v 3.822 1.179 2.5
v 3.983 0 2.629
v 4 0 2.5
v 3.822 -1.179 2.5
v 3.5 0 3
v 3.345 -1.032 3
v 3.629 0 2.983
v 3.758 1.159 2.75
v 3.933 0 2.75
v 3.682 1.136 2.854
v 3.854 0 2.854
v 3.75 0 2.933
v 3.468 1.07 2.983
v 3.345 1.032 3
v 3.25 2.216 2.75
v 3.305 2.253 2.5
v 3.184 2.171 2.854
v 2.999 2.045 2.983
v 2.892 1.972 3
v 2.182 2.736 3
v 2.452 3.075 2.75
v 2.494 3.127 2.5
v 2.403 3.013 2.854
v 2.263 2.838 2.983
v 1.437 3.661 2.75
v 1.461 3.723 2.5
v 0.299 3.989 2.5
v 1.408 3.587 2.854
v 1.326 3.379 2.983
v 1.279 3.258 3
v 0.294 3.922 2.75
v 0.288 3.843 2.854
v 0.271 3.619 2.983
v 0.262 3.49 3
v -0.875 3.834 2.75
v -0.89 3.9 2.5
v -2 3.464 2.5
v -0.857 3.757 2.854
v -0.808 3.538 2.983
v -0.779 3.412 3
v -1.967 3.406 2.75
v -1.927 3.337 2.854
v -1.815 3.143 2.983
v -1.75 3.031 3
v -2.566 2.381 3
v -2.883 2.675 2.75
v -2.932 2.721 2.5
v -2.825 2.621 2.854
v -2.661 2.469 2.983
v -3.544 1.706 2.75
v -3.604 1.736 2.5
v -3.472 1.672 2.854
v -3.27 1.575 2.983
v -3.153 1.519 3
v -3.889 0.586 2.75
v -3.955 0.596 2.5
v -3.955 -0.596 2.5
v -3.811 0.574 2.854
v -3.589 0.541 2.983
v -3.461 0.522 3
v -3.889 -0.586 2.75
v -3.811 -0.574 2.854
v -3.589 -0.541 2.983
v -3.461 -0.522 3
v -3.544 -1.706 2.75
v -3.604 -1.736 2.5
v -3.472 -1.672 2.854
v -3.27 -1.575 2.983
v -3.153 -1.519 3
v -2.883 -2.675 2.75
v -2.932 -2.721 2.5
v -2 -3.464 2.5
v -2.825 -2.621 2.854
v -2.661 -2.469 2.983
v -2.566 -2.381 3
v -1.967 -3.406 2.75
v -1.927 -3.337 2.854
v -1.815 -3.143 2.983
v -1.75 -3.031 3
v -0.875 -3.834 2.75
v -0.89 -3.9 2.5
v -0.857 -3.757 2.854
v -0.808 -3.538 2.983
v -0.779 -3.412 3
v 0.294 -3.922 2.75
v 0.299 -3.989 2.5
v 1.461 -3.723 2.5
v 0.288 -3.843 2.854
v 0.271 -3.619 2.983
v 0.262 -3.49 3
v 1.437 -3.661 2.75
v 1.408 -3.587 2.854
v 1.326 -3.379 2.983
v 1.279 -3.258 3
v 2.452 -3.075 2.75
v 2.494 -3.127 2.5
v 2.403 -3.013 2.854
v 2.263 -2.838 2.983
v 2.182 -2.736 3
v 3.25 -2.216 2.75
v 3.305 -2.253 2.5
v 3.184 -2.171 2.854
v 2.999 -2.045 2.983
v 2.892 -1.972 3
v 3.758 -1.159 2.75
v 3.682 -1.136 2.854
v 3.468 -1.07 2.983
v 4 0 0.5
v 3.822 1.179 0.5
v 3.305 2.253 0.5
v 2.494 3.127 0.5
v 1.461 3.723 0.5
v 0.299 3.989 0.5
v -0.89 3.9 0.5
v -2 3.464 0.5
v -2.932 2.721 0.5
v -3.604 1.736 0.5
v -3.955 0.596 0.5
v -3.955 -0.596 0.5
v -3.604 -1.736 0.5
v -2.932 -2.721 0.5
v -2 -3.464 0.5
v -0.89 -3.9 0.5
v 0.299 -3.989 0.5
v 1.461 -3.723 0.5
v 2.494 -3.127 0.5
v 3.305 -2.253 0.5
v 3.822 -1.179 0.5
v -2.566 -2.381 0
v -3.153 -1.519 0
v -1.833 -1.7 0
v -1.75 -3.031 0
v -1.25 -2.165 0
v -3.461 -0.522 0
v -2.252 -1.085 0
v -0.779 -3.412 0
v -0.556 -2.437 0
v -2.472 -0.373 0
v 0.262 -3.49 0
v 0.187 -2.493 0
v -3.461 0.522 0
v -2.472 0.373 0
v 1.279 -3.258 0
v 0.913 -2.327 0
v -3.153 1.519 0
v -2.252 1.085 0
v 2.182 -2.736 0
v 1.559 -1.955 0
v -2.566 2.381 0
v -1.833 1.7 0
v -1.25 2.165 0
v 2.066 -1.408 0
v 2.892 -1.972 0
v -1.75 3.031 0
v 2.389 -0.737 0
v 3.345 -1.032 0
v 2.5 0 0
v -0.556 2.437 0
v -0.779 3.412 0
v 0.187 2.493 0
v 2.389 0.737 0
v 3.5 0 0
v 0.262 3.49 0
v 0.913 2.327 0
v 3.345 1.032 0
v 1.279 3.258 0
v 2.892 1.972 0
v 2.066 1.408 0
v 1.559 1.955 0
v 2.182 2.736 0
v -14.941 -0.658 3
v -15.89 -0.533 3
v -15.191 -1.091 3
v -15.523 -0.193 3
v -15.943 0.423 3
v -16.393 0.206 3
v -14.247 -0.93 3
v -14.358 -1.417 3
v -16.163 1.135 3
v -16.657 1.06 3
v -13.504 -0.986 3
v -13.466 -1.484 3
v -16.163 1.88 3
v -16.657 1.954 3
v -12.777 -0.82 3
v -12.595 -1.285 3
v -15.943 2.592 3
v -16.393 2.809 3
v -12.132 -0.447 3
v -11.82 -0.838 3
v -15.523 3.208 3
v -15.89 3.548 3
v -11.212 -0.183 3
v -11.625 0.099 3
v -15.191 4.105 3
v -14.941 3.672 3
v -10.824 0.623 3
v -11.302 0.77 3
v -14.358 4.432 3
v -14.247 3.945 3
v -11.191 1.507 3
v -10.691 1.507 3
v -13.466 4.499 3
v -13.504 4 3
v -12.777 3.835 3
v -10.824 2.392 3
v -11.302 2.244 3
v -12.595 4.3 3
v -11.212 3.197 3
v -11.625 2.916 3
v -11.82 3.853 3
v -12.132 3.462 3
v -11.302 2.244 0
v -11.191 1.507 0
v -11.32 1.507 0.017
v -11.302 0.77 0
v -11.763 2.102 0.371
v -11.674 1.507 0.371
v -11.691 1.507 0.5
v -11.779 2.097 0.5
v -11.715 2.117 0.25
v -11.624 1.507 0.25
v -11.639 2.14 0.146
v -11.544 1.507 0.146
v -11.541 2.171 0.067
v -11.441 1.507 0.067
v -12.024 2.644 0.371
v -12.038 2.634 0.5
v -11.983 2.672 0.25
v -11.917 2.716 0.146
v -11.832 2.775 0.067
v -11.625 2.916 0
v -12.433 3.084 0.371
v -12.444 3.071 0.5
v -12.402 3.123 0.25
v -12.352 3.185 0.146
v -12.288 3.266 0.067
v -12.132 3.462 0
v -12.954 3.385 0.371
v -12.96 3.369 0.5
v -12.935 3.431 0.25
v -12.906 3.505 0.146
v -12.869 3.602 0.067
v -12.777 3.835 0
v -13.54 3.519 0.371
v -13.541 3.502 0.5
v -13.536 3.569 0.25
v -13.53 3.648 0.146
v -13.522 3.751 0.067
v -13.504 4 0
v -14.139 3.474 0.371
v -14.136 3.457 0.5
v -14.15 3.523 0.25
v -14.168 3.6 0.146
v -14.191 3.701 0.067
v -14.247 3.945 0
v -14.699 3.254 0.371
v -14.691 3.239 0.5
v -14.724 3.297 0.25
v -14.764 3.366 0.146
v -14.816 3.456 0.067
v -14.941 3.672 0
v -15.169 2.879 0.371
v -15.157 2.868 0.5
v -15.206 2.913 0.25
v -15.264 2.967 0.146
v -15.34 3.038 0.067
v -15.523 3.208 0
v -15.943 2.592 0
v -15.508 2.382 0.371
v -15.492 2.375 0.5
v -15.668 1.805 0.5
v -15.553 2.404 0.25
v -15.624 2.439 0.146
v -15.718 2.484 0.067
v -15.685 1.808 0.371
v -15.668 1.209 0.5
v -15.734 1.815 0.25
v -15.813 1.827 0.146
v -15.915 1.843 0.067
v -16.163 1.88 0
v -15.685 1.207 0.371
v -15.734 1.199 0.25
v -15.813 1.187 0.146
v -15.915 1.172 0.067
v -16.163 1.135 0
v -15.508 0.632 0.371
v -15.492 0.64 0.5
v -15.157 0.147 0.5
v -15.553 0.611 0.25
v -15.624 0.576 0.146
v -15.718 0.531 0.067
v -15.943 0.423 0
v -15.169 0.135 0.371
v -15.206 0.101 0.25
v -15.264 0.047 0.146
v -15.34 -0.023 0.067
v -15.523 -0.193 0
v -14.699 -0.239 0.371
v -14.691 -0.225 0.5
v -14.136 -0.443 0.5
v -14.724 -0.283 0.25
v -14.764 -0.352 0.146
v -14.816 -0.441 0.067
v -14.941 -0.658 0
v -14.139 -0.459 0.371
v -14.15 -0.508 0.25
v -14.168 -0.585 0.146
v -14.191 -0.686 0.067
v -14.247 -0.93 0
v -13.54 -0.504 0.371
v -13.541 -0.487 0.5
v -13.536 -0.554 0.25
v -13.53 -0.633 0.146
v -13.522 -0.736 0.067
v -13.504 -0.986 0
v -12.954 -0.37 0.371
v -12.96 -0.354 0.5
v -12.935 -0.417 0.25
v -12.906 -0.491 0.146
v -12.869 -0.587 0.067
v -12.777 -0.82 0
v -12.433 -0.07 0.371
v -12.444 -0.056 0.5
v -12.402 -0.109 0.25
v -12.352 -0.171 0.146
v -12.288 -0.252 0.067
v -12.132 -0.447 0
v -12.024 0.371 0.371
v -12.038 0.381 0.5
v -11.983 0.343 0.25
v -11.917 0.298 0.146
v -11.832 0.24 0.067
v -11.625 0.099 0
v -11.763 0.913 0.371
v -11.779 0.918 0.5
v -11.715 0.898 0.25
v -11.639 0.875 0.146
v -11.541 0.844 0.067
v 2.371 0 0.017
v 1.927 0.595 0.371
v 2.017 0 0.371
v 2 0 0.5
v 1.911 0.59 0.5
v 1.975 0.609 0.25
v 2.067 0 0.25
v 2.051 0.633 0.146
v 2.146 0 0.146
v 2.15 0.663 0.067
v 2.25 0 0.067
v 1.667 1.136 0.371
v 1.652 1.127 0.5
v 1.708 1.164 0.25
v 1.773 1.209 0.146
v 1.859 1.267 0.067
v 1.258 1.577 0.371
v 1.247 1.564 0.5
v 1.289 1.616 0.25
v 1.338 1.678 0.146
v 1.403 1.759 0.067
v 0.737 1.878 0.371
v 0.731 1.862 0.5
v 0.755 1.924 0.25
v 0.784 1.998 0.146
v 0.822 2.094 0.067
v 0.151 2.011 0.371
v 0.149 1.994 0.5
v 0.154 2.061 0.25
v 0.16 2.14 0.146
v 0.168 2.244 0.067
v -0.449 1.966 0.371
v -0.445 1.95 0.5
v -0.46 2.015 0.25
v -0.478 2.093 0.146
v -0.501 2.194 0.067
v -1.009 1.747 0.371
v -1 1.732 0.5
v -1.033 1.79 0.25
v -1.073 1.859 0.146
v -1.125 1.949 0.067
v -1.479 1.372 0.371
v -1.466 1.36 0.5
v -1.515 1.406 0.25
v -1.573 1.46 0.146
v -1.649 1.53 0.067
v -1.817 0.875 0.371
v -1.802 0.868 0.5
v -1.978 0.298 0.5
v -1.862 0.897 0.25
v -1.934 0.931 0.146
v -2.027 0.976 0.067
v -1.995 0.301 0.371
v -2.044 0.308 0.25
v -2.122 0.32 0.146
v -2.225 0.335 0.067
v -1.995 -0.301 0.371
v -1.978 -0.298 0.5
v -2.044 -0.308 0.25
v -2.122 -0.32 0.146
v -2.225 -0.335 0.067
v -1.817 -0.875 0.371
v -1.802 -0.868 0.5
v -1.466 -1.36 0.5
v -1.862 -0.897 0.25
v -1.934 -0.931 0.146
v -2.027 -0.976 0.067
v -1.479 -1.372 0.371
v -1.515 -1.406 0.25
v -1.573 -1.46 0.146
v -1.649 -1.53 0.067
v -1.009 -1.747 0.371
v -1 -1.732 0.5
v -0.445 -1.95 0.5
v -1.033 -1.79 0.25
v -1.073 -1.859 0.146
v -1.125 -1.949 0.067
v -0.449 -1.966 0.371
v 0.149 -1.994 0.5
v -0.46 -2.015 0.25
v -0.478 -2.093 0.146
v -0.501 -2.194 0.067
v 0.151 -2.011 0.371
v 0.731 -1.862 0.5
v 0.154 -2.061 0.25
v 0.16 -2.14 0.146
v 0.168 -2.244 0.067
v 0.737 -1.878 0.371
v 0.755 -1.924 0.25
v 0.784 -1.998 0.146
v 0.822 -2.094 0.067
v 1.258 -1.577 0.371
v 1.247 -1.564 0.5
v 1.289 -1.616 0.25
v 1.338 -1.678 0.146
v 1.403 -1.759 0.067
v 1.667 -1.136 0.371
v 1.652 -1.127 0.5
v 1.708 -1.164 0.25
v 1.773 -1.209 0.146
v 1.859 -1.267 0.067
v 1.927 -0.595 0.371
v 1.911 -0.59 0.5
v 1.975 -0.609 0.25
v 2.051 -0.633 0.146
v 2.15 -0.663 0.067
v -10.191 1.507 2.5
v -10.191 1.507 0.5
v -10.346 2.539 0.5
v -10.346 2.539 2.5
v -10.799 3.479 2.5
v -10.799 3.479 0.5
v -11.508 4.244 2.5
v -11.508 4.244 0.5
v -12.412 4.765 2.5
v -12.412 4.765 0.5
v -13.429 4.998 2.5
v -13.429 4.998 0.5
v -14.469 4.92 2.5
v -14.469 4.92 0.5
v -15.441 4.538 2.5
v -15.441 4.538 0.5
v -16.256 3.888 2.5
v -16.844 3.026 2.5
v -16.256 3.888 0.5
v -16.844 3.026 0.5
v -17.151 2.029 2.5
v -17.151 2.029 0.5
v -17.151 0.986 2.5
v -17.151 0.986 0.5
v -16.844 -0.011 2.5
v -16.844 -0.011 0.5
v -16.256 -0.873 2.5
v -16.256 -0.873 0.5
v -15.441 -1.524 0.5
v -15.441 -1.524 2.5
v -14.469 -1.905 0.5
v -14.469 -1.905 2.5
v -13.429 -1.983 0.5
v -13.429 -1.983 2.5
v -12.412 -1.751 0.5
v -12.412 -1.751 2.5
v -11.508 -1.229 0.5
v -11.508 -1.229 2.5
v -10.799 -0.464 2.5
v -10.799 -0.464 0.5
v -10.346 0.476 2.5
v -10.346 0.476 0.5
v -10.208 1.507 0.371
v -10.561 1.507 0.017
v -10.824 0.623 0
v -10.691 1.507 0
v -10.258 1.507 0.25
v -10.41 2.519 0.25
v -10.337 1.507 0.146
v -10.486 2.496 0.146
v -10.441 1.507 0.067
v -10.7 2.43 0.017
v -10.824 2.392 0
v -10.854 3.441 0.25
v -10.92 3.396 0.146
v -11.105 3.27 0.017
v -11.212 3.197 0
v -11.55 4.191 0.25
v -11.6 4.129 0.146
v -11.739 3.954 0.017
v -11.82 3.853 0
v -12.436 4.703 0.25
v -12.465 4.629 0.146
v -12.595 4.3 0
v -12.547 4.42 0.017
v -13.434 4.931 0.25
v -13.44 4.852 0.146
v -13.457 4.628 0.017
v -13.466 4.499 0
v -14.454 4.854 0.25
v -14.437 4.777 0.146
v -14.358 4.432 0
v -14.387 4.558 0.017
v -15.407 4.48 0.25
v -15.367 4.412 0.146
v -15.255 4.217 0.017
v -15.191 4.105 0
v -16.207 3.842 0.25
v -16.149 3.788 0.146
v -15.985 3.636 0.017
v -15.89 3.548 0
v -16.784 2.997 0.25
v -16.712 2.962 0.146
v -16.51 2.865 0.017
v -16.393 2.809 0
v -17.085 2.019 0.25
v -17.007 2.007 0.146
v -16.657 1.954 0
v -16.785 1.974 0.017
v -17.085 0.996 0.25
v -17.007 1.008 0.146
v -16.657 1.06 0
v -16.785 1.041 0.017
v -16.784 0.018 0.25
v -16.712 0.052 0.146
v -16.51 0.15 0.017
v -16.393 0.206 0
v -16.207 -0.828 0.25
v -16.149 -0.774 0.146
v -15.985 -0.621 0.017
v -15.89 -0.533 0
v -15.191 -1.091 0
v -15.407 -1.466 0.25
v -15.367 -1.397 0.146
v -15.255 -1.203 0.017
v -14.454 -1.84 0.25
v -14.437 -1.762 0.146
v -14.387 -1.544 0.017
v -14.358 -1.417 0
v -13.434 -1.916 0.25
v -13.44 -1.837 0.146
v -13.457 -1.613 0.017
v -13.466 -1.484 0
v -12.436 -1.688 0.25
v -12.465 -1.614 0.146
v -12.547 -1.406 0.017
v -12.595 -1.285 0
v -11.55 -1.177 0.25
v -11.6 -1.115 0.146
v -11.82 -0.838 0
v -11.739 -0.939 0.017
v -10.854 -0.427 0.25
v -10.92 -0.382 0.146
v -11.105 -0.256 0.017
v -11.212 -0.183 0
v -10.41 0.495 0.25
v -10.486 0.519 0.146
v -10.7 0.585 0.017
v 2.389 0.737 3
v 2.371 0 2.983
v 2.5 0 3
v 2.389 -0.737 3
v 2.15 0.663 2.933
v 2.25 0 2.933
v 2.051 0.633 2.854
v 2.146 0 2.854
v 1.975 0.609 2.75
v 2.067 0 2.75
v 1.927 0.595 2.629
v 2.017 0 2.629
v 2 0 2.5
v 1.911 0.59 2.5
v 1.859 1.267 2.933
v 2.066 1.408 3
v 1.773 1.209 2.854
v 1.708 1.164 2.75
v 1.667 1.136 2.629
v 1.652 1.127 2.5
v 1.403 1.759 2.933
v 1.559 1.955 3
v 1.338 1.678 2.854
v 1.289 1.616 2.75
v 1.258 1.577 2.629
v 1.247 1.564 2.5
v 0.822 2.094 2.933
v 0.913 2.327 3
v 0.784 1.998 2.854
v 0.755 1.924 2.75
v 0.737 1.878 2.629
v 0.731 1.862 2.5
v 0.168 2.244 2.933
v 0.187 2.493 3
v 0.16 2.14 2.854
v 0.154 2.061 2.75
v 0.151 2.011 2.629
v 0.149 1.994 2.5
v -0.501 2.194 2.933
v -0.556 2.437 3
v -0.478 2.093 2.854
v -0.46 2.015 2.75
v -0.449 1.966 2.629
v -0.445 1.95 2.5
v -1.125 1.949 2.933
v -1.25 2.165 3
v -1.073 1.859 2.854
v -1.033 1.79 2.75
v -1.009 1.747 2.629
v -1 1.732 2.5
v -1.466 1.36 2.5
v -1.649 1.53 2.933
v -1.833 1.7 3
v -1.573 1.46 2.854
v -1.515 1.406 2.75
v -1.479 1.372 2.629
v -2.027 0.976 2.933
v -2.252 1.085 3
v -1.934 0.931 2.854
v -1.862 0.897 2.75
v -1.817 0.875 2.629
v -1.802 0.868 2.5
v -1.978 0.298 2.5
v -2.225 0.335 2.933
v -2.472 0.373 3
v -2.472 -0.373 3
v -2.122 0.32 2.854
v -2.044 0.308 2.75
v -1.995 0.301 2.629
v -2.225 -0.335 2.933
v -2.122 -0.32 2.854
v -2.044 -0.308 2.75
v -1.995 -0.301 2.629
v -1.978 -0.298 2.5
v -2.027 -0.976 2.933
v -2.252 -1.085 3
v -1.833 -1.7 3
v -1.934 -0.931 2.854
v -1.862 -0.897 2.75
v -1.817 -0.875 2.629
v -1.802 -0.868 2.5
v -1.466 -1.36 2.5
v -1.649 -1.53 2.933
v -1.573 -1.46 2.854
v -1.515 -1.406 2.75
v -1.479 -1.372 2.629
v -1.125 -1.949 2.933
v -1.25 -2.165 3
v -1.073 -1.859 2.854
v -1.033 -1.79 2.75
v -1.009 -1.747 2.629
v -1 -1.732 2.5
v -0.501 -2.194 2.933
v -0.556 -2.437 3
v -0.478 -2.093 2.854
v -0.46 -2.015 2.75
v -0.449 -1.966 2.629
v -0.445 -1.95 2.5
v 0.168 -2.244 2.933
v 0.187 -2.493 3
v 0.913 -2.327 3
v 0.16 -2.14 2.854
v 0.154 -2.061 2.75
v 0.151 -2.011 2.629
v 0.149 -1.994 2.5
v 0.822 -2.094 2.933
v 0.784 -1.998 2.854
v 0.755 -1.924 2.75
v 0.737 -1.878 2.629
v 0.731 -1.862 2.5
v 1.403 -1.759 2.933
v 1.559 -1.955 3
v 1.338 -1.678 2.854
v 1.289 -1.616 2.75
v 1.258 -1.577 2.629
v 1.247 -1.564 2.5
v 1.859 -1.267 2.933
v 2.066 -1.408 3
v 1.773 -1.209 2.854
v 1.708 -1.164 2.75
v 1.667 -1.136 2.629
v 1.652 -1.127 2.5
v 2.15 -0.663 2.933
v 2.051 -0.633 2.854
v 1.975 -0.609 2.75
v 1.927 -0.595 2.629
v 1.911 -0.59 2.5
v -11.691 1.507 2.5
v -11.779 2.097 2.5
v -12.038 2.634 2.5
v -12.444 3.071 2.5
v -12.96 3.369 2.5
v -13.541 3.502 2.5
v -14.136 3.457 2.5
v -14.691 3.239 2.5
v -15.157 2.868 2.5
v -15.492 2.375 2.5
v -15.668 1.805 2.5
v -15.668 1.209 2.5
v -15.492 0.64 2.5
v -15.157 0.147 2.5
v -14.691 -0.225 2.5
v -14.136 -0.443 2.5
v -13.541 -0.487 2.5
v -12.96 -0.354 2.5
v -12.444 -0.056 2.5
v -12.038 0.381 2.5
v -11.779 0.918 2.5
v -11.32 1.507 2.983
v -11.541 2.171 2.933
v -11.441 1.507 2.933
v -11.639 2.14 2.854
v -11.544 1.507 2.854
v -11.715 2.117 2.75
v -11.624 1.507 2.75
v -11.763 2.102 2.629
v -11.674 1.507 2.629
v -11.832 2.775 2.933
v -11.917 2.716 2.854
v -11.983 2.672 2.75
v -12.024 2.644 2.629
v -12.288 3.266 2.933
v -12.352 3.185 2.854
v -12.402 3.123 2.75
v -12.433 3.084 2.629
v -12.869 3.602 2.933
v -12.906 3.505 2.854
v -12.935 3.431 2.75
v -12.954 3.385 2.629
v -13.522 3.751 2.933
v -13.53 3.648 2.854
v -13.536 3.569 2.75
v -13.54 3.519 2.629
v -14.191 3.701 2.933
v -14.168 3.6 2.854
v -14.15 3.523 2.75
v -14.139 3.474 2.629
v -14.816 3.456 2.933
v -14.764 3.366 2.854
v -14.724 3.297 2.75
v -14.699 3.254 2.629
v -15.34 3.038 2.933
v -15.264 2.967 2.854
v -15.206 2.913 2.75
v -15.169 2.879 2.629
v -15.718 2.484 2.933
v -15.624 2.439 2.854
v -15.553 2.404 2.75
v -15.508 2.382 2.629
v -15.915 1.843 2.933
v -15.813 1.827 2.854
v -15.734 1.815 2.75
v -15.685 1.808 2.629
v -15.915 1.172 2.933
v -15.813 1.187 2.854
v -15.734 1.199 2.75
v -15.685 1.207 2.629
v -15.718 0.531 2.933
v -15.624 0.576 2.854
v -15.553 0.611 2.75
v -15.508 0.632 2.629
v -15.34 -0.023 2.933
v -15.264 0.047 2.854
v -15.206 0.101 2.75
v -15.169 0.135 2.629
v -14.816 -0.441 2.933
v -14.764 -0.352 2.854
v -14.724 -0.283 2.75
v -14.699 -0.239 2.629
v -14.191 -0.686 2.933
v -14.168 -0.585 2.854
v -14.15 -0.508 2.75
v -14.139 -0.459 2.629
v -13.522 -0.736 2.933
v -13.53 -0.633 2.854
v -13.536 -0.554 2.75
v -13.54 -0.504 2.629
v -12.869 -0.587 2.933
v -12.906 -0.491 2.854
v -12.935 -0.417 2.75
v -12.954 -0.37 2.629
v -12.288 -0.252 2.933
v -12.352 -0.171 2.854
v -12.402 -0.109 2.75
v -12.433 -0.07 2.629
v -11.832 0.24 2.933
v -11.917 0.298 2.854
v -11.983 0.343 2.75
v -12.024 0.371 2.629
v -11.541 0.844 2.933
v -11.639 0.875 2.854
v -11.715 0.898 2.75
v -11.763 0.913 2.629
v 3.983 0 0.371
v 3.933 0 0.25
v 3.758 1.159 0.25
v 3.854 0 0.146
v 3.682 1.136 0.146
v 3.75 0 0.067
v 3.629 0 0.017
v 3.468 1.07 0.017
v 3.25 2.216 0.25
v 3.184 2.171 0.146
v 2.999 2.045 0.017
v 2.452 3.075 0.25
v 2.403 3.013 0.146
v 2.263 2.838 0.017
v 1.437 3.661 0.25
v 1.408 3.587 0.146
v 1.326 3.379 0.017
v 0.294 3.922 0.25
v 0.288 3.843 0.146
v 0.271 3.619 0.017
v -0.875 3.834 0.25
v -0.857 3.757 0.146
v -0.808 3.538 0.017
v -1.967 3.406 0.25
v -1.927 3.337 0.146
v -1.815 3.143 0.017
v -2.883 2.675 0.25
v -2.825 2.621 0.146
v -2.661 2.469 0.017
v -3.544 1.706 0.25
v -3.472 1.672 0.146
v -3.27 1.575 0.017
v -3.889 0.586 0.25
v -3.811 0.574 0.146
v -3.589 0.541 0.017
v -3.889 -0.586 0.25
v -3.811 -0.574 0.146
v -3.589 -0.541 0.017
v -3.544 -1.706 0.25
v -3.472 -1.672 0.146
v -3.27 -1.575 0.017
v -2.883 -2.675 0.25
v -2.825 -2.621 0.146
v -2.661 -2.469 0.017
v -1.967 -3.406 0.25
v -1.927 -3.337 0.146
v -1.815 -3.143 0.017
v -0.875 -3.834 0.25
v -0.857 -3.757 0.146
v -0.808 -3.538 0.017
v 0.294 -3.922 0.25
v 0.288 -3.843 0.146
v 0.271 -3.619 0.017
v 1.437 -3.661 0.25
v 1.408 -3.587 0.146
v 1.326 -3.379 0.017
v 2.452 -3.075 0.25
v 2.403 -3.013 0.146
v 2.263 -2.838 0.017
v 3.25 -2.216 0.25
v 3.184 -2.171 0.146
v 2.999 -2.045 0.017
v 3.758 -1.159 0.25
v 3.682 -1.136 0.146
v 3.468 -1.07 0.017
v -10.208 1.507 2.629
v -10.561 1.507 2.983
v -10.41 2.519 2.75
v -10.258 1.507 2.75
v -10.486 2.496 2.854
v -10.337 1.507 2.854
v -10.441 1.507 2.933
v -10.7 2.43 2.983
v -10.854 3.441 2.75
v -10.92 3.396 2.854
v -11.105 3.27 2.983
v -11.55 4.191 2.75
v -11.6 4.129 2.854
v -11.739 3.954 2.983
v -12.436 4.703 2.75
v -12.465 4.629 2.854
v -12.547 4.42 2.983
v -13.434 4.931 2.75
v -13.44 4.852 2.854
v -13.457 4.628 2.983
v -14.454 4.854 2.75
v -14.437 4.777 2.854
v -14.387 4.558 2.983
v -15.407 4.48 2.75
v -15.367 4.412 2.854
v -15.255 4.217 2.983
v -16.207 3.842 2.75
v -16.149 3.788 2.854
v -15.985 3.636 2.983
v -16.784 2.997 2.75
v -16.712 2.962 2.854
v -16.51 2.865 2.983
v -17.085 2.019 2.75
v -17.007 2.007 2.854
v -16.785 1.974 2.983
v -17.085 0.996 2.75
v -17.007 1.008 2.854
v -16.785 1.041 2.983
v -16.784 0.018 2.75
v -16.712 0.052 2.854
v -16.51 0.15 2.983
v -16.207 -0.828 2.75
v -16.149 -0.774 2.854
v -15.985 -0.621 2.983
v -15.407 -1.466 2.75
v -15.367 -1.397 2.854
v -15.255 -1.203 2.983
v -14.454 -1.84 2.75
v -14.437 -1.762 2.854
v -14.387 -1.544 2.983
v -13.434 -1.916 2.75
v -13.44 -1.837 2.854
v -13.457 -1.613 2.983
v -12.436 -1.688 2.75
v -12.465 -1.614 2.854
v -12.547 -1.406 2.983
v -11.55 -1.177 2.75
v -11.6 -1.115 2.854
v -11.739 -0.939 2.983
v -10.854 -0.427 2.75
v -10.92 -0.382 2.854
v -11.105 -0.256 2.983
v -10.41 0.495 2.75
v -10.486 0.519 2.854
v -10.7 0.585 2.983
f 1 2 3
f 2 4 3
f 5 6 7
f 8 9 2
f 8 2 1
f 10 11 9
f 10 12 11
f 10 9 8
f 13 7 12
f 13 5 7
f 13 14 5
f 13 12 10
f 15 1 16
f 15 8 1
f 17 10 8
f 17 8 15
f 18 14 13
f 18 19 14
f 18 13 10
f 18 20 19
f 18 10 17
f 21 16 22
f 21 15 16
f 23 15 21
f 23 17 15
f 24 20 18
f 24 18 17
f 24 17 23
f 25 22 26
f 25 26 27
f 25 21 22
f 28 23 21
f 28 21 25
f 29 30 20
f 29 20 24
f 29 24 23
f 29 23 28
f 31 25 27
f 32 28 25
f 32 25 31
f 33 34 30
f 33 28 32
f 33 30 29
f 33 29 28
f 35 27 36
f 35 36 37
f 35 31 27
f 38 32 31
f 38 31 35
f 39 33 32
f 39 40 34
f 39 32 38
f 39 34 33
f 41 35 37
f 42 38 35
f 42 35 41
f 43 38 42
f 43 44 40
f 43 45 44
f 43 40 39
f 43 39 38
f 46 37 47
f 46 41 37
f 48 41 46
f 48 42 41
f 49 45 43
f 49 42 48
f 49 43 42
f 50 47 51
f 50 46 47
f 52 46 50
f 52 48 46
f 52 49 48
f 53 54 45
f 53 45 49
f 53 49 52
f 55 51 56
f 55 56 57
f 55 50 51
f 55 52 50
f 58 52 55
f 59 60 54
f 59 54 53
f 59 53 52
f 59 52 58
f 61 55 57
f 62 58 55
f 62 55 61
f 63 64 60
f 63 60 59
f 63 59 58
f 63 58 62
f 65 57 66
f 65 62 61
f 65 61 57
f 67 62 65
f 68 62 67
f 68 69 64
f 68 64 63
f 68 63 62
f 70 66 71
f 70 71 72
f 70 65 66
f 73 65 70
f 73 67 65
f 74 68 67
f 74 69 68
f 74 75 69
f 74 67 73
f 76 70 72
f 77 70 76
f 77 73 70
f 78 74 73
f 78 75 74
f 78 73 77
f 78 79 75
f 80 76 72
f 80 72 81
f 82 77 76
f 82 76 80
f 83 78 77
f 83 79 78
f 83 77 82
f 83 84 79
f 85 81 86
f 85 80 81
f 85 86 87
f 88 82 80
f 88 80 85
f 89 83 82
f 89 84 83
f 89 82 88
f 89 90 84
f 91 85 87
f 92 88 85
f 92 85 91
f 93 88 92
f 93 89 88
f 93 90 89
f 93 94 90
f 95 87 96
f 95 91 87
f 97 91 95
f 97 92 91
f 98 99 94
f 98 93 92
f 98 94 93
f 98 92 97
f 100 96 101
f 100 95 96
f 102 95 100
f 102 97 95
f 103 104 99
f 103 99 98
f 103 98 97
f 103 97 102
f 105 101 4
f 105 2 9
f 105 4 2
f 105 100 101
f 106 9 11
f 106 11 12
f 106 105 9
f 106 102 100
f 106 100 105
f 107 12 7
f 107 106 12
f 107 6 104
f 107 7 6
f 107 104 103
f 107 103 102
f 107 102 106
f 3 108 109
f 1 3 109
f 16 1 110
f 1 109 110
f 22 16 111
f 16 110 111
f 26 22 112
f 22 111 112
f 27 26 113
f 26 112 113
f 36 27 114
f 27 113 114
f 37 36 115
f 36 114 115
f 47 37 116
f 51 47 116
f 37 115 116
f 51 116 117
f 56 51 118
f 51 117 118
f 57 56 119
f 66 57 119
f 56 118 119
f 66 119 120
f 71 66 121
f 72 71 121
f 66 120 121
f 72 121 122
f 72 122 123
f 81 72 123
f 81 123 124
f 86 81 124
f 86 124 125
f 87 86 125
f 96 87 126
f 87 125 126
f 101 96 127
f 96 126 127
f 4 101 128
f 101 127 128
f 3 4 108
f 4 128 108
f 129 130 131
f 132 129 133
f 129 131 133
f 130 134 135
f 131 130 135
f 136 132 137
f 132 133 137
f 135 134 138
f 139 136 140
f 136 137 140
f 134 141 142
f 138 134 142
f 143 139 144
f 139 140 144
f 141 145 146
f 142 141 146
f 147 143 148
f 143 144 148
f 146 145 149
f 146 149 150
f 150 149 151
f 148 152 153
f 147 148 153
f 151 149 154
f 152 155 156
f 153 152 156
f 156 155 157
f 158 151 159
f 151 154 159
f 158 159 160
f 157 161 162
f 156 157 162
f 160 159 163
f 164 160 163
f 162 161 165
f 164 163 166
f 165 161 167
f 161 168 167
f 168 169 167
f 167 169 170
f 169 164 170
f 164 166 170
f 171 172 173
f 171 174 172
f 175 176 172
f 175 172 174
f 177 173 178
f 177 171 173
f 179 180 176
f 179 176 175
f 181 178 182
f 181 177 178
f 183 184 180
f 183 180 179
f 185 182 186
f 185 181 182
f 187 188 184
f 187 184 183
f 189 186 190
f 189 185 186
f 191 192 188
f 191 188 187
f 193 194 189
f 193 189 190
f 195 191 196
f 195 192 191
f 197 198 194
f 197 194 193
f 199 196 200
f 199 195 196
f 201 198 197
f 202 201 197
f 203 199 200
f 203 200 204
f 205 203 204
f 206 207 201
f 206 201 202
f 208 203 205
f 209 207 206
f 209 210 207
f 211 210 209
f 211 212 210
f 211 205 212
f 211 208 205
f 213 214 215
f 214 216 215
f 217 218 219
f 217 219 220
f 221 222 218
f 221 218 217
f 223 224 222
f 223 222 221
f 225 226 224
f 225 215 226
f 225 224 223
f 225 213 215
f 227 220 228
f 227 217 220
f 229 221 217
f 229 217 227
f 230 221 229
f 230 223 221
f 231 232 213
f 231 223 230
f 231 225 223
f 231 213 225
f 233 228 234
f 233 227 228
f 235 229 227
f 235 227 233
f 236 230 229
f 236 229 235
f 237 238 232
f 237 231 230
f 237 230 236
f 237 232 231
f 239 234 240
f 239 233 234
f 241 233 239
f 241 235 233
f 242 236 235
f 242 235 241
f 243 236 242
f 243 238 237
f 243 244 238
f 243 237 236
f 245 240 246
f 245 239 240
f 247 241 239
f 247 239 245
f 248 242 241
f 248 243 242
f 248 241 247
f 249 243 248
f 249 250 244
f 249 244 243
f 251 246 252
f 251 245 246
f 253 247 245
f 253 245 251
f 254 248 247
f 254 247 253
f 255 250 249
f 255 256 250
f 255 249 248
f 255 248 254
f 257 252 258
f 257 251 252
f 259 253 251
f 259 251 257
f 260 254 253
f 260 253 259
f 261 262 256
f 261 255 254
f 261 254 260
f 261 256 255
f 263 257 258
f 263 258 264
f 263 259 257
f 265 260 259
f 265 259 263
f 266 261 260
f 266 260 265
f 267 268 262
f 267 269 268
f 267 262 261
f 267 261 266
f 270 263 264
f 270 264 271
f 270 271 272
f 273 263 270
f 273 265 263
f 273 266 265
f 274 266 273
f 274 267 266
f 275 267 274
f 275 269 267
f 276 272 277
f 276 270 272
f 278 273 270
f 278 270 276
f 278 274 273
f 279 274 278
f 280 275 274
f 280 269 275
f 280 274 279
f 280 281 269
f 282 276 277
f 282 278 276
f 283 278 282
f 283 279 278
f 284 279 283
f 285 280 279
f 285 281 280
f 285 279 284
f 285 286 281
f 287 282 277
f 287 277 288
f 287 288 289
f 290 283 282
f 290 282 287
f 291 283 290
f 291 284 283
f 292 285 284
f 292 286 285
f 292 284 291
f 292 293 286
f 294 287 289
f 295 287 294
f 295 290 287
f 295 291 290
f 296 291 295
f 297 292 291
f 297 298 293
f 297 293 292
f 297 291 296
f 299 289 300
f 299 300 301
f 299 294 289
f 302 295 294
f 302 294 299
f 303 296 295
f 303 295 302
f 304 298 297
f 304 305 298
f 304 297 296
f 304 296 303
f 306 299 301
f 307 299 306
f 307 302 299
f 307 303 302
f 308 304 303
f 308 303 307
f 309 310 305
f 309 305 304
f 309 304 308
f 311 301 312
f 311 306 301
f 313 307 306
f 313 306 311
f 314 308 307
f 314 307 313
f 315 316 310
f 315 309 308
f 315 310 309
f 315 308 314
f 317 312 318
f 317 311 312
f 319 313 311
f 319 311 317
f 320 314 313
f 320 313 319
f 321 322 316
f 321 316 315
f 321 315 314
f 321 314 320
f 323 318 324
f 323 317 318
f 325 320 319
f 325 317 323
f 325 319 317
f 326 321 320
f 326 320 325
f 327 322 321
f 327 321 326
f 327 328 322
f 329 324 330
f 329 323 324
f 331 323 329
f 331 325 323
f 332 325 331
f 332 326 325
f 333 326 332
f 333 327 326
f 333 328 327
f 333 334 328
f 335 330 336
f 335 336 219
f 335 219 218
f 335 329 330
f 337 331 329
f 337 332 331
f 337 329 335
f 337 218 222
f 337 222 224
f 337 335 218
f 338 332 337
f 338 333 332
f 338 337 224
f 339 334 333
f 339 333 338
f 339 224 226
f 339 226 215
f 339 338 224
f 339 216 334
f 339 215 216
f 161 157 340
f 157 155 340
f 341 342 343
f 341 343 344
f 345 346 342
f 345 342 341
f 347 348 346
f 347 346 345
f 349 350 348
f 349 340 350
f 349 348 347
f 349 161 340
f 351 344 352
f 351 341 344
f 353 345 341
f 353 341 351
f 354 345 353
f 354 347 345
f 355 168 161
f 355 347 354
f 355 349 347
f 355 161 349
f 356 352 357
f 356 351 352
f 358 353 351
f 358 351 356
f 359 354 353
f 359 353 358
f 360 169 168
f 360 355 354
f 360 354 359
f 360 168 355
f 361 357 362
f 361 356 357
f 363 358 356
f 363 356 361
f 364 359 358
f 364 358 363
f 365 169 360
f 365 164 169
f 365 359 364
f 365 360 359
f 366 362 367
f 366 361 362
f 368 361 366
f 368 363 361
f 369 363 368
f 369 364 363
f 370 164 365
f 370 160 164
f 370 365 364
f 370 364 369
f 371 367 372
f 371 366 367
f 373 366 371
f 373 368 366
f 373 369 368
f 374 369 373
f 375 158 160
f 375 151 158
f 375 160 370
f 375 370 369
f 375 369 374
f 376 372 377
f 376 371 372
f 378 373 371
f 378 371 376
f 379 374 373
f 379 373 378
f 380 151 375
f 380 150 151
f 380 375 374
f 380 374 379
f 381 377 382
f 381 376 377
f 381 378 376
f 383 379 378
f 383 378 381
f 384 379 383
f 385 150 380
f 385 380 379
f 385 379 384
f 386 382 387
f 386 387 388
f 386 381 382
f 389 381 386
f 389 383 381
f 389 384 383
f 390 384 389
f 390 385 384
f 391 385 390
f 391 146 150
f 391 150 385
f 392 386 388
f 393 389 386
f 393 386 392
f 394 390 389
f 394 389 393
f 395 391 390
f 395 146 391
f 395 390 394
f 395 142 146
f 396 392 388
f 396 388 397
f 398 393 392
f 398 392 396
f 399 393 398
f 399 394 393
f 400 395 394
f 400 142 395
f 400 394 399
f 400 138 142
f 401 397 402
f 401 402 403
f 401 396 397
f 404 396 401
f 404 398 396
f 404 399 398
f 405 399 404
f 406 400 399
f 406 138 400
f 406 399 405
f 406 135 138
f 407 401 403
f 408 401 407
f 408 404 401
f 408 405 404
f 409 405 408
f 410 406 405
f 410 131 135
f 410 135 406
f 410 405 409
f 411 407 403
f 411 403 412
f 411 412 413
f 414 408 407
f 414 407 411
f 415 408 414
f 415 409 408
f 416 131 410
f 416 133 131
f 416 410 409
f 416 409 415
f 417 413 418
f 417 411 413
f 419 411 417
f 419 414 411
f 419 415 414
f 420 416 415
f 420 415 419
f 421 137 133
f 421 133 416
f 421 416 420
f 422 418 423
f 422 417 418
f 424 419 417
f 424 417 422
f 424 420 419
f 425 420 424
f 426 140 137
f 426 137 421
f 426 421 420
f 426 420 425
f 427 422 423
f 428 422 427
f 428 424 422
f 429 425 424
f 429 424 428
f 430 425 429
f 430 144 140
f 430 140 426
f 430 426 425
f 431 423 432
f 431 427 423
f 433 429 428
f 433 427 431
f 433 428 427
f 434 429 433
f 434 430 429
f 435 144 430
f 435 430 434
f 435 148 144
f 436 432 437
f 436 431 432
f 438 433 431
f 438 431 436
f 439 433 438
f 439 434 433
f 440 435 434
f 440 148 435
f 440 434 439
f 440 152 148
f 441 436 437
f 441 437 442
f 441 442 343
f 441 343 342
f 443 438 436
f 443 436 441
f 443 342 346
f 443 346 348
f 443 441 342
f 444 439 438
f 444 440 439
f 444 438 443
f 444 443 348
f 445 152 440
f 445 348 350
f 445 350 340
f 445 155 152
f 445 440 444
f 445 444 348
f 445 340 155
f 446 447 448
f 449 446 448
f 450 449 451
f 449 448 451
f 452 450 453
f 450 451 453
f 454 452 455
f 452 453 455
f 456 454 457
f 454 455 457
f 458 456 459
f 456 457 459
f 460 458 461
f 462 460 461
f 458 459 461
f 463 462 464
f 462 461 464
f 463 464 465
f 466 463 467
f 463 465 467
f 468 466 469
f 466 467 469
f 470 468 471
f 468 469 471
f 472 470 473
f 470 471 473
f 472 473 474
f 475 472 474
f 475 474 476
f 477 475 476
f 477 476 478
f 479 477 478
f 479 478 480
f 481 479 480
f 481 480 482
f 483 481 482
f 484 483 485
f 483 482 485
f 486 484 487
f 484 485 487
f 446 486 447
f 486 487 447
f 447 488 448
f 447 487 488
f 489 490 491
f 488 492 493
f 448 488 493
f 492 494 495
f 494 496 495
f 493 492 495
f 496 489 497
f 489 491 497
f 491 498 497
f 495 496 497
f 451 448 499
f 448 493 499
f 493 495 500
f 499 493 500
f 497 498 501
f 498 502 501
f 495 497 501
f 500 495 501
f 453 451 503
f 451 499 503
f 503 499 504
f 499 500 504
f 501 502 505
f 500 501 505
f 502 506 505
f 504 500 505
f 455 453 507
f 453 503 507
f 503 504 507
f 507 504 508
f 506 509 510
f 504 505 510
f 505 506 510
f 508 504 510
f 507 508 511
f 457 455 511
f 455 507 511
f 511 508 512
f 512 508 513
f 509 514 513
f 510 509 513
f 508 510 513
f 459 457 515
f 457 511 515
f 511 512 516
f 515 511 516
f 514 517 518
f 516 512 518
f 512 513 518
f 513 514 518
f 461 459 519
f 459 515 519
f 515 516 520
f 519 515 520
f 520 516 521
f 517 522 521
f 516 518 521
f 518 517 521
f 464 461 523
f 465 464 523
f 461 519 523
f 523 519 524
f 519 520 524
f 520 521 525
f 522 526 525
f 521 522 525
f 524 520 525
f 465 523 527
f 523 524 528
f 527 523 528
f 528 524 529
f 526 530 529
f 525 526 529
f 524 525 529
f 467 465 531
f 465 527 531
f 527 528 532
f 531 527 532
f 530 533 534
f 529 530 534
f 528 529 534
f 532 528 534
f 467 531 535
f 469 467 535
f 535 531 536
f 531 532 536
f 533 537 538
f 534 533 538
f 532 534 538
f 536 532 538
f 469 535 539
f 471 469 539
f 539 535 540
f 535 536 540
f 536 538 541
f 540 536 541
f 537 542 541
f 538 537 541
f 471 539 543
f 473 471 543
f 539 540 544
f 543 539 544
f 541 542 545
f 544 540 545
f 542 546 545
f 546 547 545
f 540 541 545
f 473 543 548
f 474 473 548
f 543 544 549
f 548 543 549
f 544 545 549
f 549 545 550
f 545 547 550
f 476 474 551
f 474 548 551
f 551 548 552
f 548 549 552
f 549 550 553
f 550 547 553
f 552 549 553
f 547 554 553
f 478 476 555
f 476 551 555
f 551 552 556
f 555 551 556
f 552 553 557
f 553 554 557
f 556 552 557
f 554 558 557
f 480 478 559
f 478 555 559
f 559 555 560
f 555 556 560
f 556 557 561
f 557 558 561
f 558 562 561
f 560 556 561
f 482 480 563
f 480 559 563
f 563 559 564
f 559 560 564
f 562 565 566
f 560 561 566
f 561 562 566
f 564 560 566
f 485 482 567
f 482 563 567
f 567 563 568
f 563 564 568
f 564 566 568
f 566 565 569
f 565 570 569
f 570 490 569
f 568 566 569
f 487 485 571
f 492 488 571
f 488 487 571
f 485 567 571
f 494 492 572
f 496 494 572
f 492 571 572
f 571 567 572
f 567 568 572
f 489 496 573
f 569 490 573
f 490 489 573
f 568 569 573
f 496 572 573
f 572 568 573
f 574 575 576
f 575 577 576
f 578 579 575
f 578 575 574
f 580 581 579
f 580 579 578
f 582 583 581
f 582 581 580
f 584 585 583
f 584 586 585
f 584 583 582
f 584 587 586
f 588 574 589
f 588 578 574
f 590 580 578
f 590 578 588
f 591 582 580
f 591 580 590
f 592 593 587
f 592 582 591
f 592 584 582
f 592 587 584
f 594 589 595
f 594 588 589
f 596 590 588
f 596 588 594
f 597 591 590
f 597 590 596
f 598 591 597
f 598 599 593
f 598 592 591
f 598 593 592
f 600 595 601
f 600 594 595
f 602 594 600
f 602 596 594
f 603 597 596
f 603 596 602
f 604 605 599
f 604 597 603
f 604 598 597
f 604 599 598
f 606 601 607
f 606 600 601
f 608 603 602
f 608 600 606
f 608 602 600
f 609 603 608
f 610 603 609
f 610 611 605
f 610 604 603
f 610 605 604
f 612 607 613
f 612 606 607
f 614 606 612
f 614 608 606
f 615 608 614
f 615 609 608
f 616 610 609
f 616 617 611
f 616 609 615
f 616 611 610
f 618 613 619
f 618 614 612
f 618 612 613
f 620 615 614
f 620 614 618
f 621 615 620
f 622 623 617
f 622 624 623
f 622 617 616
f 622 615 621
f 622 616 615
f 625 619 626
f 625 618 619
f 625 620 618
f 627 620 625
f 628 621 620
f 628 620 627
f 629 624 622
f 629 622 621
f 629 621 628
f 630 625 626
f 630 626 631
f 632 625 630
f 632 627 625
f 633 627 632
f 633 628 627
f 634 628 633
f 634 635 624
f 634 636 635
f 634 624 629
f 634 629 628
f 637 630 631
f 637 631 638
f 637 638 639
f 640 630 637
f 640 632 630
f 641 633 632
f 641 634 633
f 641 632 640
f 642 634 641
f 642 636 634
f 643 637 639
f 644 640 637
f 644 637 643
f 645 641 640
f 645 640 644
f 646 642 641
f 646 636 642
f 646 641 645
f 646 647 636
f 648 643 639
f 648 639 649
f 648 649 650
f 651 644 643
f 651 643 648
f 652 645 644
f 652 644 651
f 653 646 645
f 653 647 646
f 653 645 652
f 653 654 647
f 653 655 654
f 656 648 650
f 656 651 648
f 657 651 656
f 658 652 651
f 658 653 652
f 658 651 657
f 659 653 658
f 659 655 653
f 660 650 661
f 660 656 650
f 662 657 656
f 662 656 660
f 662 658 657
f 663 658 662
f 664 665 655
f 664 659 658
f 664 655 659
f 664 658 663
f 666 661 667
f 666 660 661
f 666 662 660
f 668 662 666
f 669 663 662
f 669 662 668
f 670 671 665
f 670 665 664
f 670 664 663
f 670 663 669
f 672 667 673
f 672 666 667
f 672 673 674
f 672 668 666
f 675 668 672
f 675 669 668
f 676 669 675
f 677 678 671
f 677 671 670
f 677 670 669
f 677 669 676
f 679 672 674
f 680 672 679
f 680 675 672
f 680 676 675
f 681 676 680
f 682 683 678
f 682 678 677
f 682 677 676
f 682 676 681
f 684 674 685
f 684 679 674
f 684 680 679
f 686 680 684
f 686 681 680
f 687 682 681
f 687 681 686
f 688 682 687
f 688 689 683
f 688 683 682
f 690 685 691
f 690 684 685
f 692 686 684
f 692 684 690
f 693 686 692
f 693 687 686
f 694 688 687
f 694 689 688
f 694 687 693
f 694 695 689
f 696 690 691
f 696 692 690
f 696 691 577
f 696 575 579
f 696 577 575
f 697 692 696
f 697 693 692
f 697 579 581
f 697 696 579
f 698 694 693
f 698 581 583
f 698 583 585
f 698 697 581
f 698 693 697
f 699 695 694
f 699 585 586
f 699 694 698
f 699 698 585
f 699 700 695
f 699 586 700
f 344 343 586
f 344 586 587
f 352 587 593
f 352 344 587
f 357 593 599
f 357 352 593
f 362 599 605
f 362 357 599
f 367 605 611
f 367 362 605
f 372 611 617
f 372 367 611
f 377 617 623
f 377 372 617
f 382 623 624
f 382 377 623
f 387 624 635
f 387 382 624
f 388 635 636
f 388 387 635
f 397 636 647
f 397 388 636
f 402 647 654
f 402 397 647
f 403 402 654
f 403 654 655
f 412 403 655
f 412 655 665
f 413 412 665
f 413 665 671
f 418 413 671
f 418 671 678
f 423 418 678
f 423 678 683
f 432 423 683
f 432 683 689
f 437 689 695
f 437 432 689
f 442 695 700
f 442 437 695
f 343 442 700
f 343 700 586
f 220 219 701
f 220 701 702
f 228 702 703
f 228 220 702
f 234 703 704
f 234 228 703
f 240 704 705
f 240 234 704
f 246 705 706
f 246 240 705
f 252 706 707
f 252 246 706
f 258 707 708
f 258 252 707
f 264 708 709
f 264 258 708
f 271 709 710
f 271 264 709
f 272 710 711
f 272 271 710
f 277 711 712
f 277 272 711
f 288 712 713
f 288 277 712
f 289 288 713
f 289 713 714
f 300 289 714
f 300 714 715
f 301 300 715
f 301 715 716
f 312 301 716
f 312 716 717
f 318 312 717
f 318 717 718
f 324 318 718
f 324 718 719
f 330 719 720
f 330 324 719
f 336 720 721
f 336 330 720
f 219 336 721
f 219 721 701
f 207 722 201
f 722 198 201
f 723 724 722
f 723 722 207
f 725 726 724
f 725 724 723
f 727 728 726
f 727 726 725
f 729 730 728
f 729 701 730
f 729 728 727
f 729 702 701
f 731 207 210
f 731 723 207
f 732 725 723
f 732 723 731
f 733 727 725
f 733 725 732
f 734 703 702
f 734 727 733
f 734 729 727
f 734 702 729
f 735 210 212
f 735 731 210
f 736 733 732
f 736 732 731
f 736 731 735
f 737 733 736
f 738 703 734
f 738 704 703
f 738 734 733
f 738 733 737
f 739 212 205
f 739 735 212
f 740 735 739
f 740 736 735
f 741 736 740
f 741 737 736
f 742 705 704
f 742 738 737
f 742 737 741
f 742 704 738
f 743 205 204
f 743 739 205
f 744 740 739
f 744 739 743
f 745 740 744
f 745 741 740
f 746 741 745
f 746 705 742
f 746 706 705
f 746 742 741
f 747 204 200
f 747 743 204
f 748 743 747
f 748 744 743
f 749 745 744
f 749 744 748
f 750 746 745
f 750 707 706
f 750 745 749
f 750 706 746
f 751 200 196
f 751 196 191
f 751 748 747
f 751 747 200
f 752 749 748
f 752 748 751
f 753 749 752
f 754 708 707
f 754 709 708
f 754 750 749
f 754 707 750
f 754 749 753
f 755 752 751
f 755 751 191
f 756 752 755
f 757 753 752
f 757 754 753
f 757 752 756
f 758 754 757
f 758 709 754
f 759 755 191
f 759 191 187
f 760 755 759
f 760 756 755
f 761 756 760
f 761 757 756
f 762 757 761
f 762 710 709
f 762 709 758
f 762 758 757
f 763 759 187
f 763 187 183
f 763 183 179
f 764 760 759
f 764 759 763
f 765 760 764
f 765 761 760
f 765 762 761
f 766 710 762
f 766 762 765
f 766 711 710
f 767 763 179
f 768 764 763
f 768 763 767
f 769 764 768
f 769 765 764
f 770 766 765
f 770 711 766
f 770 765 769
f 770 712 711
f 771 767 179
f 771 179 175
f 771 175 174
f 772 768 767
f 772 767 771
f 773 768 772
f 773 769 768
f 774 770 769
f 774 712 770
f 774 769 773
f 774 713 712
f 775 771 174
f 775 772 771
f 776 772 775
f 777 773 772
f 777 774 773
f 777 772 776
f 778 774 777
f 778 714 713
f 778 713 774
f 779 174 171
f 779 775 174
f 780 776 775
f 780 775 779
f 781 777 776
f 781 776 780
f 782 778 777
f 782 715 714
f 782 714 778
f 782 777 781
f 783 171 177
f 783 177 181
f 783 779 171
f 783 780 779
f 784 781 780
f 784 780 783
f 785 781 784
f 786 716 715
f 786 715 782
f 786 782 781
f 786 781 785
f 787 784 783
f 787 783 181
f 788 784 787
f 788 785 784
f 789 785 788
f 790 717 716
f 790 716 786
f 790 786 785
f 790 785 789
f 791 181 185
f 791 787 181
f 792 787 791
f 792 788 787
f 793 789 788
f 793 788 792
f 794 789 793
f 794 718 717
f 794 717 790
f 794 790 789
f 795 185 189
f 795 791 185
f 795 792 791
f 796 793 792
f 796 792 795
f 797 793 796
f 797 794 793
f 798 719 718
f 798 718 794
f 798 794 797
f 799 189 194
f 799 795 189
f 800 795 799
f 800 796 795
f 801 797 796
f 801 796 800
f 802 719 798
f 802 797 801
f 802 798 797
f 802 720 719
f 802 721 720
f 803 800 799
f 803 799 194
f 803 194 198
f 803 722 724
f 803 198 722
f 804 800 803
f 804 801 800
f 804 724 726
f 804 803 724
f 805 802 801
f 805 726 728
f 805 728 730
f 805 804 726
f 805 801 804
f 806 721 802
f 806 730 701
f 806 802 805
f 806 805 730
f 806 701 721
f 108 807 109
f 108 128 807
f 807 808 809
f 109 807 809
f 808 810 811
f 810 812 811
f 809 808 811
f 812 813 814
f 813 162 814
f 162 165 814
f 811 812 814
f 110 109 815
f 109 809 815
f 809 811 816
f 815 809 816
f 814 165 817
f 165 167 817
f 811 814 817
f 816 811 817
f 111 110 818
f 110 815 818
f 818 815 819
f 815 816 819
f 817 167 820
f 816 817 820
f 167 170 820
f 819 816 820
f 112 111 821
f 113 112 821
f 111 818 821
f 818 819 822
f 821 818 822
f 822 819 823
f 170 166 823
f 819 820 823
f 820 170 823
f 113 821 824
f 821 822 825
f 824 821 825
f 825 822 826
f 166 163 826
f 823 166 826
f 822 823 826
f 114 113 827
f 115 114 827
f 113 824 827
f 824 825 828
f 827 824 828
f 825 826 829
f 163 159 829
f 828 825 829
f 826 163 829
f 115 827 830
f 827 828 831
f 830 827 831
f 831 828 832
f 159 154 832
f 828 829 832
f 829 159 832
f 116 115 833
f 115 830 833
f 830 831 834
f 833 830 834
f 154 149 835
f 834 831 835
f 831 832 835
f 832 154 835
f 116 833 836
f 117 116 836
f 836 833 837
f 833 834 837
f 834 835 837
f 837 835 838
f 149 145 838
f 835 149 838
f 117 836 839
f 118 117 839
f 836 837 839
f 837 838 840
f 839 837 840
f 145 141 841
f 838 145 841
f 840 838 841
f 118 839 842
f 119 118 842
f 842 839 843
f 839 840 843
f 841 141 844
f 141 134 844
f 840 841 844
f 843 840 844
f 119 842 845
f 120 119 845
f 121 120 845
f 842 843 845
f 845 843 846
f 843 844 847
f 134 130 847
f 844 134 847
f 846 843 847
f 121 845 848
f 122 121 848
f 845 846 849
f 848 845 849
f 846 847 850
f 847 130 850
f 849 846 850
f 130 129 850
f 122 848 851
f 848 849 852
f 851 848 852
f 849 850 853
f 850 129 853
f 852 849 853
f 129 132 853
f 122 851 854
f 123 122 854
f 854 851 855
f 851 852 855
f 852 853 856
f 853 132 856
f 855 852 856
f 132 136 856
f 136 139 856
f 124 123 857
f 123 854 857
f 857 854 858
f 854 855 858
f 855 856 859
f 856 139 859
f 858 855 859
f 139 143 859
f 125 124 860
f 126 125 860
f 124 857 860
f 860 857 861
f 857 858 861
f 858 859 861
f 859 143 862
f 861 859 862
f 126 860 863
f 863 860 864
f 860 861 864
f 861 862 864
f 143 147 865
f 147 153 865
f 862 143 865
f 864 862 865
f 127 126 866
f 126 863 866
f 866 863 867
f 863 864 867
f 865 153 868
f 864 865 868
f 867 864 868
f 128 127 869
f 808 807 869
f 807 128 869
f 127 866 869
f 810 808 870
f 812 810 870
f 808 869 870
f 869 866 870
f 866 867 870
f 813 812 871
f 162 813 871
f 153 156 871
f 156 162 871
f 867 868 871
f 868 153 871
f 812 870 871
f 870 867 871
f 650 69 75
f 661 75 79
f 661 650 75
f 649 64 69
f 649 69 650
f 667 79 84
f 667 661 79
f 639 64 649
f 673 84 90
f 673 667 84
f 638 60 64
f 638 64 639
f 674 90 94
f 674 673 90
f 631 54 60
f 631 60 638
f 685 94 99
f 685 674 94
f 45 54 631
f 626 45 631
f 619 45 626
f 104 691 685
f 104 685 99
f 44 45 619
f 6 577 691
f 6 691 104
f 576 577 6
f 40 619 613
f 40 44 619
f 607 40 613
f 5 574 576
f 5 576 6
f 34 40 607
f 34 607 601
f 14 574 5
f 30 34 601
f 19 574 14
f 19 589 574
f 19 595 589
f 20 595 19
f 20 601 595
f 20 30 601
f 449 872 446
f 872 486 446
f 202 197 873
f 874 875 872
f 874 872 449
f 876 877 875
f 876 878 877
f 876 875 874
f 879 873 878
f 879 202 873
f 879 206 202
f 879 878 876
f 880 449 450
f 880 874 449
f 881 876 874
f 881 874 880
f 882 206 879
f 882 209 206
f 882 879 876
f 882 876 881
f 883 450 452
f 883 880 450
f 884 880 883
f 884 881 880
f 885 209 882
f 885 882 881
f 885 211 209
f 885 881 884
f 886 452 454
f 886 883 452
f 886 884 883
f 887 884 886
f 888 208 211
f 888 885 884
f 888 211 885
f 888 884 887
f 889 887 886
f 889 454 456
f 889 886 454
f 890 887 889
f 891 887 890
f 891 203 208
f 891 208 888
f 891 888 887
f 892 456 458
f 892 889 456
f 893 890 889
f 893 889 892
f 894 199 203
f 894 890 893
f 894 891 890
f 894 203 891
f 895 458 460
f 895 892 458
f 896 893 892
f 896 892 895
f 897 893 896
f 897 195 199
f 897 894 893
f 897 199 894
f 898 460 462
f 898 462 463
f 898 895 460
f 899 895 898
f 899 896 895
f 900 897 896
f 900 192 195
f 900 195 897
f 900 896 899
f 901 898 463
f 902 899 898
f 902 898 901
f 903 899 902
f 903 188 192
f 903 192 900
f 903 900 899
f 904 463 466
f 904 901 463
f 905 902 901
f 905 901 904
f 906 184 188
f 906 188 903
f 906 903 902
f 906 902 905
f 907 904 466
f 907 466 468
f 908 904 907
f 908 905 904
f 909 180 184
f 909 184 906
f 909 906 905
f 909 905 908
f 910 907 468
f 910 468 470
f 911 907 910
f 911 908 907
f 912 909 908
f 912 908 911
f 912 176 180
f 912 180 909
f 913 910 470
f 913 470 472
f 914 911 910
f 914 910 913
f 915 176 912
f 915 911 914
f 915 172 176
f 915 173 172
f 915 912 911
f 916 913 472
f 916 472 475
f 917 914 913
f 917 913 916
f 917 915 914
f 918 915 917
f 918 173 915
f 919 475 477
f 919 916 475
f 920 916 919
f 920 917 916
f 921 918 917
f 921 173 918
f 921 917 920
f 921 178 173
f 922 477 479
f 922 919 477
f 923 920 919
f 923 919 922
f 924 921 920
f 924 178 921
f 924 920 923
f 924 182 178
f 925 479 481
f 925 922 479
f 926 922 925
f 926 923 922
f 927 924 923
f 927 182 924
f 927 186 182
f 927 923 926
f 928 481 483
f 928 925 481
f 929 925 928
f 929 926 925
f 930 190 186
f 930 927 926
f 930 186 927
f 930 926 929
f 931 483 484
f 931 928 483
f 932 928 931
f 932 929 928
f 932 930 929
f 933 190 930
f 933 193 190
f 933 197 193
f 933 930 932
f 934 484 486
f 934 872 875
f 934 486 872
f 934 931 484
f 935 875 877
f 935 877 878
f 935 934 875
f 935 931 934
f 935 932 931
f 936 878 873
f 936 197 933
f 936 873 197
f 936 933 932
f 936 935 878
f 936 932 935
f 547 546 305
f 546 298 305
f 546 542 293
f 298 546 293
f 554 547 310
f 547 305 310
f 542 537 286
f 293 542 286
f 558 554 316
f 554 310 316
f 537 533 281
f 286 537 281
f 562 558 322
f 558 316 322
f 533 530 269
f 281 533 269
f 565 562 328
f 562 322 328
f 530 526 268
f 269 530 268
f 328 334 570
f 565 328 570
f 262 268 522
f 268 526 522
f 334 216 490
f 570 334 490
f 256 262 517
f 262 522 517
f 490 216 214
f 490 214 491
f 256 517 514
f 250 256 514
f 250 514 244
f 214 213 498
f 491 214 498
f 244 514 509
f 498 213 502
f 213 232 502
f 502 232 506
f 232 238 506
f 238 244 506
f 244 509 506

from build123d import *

# Parameters (mm, degrees)
F0_R     = 4
F0_R_2   = 2
F1_DEPTH = 3
F2_R     = 0.5
F0_R_3   = 3.5
F3_DEPTH = 3
F4_R     = 0.5
F5_R     = 0.5


with BuildPart() as f1:
    # F0 (on Top) → F1 (new body)
    with BuildSketch(Plane.XY):
        Circle(F0_R)
        Circle(F0_R_2, mode=Mode.SUBTRACT)
    extrude(amount=F1_DEPTH)

    # F2
    f2_edges = [f1.edges().sort_by_distance(p)[0] for p in [
        (-2, 0, 3),
        (-2, 0, 0),
        (-4, 0, 0),
        (-4, 0, 3),
    ]]
    fillet(f2_edges, radius=F2_R)

    # F0 (on Top) → F3 (join)
    with BuildSketch(Plane.XY):
        Circle(F0_R)
        Circle(F0_R_2, mode=Mode.SUBTRACT)
        with Locations((-13.690544, 1.507337)):
            Circle(F0_R_3)
        with Locations((-13.690544, 1.507337)):
            Circle(F0_R_2, mode=Mode.SUBTRACT)
    extrude(amount=F3_DEPTH)

    # F4
    f4_edges = [f1.edges().sort_by_distance(p)[0] for p in [
        (-17.190544, 1.507337, 3),
        (-15.690544, 1.507337, 3),
        (-17.190544, 1.507337, 0),
        (-15.690544, 1.507337, 0),
    ]]
    fillet(f4_edges, radius=F4_R)

    # F5
    f5_edges = [f1.edges().sort_by_distance(p)[0] for p in [
        (-4, 0, 3),
        (-2, 0, 3),
        (-4, 0, 0),
        (-2, 0, 0),
    ]]
    fillet(f5_edges, radius=F5_R)


solid = f1.part
